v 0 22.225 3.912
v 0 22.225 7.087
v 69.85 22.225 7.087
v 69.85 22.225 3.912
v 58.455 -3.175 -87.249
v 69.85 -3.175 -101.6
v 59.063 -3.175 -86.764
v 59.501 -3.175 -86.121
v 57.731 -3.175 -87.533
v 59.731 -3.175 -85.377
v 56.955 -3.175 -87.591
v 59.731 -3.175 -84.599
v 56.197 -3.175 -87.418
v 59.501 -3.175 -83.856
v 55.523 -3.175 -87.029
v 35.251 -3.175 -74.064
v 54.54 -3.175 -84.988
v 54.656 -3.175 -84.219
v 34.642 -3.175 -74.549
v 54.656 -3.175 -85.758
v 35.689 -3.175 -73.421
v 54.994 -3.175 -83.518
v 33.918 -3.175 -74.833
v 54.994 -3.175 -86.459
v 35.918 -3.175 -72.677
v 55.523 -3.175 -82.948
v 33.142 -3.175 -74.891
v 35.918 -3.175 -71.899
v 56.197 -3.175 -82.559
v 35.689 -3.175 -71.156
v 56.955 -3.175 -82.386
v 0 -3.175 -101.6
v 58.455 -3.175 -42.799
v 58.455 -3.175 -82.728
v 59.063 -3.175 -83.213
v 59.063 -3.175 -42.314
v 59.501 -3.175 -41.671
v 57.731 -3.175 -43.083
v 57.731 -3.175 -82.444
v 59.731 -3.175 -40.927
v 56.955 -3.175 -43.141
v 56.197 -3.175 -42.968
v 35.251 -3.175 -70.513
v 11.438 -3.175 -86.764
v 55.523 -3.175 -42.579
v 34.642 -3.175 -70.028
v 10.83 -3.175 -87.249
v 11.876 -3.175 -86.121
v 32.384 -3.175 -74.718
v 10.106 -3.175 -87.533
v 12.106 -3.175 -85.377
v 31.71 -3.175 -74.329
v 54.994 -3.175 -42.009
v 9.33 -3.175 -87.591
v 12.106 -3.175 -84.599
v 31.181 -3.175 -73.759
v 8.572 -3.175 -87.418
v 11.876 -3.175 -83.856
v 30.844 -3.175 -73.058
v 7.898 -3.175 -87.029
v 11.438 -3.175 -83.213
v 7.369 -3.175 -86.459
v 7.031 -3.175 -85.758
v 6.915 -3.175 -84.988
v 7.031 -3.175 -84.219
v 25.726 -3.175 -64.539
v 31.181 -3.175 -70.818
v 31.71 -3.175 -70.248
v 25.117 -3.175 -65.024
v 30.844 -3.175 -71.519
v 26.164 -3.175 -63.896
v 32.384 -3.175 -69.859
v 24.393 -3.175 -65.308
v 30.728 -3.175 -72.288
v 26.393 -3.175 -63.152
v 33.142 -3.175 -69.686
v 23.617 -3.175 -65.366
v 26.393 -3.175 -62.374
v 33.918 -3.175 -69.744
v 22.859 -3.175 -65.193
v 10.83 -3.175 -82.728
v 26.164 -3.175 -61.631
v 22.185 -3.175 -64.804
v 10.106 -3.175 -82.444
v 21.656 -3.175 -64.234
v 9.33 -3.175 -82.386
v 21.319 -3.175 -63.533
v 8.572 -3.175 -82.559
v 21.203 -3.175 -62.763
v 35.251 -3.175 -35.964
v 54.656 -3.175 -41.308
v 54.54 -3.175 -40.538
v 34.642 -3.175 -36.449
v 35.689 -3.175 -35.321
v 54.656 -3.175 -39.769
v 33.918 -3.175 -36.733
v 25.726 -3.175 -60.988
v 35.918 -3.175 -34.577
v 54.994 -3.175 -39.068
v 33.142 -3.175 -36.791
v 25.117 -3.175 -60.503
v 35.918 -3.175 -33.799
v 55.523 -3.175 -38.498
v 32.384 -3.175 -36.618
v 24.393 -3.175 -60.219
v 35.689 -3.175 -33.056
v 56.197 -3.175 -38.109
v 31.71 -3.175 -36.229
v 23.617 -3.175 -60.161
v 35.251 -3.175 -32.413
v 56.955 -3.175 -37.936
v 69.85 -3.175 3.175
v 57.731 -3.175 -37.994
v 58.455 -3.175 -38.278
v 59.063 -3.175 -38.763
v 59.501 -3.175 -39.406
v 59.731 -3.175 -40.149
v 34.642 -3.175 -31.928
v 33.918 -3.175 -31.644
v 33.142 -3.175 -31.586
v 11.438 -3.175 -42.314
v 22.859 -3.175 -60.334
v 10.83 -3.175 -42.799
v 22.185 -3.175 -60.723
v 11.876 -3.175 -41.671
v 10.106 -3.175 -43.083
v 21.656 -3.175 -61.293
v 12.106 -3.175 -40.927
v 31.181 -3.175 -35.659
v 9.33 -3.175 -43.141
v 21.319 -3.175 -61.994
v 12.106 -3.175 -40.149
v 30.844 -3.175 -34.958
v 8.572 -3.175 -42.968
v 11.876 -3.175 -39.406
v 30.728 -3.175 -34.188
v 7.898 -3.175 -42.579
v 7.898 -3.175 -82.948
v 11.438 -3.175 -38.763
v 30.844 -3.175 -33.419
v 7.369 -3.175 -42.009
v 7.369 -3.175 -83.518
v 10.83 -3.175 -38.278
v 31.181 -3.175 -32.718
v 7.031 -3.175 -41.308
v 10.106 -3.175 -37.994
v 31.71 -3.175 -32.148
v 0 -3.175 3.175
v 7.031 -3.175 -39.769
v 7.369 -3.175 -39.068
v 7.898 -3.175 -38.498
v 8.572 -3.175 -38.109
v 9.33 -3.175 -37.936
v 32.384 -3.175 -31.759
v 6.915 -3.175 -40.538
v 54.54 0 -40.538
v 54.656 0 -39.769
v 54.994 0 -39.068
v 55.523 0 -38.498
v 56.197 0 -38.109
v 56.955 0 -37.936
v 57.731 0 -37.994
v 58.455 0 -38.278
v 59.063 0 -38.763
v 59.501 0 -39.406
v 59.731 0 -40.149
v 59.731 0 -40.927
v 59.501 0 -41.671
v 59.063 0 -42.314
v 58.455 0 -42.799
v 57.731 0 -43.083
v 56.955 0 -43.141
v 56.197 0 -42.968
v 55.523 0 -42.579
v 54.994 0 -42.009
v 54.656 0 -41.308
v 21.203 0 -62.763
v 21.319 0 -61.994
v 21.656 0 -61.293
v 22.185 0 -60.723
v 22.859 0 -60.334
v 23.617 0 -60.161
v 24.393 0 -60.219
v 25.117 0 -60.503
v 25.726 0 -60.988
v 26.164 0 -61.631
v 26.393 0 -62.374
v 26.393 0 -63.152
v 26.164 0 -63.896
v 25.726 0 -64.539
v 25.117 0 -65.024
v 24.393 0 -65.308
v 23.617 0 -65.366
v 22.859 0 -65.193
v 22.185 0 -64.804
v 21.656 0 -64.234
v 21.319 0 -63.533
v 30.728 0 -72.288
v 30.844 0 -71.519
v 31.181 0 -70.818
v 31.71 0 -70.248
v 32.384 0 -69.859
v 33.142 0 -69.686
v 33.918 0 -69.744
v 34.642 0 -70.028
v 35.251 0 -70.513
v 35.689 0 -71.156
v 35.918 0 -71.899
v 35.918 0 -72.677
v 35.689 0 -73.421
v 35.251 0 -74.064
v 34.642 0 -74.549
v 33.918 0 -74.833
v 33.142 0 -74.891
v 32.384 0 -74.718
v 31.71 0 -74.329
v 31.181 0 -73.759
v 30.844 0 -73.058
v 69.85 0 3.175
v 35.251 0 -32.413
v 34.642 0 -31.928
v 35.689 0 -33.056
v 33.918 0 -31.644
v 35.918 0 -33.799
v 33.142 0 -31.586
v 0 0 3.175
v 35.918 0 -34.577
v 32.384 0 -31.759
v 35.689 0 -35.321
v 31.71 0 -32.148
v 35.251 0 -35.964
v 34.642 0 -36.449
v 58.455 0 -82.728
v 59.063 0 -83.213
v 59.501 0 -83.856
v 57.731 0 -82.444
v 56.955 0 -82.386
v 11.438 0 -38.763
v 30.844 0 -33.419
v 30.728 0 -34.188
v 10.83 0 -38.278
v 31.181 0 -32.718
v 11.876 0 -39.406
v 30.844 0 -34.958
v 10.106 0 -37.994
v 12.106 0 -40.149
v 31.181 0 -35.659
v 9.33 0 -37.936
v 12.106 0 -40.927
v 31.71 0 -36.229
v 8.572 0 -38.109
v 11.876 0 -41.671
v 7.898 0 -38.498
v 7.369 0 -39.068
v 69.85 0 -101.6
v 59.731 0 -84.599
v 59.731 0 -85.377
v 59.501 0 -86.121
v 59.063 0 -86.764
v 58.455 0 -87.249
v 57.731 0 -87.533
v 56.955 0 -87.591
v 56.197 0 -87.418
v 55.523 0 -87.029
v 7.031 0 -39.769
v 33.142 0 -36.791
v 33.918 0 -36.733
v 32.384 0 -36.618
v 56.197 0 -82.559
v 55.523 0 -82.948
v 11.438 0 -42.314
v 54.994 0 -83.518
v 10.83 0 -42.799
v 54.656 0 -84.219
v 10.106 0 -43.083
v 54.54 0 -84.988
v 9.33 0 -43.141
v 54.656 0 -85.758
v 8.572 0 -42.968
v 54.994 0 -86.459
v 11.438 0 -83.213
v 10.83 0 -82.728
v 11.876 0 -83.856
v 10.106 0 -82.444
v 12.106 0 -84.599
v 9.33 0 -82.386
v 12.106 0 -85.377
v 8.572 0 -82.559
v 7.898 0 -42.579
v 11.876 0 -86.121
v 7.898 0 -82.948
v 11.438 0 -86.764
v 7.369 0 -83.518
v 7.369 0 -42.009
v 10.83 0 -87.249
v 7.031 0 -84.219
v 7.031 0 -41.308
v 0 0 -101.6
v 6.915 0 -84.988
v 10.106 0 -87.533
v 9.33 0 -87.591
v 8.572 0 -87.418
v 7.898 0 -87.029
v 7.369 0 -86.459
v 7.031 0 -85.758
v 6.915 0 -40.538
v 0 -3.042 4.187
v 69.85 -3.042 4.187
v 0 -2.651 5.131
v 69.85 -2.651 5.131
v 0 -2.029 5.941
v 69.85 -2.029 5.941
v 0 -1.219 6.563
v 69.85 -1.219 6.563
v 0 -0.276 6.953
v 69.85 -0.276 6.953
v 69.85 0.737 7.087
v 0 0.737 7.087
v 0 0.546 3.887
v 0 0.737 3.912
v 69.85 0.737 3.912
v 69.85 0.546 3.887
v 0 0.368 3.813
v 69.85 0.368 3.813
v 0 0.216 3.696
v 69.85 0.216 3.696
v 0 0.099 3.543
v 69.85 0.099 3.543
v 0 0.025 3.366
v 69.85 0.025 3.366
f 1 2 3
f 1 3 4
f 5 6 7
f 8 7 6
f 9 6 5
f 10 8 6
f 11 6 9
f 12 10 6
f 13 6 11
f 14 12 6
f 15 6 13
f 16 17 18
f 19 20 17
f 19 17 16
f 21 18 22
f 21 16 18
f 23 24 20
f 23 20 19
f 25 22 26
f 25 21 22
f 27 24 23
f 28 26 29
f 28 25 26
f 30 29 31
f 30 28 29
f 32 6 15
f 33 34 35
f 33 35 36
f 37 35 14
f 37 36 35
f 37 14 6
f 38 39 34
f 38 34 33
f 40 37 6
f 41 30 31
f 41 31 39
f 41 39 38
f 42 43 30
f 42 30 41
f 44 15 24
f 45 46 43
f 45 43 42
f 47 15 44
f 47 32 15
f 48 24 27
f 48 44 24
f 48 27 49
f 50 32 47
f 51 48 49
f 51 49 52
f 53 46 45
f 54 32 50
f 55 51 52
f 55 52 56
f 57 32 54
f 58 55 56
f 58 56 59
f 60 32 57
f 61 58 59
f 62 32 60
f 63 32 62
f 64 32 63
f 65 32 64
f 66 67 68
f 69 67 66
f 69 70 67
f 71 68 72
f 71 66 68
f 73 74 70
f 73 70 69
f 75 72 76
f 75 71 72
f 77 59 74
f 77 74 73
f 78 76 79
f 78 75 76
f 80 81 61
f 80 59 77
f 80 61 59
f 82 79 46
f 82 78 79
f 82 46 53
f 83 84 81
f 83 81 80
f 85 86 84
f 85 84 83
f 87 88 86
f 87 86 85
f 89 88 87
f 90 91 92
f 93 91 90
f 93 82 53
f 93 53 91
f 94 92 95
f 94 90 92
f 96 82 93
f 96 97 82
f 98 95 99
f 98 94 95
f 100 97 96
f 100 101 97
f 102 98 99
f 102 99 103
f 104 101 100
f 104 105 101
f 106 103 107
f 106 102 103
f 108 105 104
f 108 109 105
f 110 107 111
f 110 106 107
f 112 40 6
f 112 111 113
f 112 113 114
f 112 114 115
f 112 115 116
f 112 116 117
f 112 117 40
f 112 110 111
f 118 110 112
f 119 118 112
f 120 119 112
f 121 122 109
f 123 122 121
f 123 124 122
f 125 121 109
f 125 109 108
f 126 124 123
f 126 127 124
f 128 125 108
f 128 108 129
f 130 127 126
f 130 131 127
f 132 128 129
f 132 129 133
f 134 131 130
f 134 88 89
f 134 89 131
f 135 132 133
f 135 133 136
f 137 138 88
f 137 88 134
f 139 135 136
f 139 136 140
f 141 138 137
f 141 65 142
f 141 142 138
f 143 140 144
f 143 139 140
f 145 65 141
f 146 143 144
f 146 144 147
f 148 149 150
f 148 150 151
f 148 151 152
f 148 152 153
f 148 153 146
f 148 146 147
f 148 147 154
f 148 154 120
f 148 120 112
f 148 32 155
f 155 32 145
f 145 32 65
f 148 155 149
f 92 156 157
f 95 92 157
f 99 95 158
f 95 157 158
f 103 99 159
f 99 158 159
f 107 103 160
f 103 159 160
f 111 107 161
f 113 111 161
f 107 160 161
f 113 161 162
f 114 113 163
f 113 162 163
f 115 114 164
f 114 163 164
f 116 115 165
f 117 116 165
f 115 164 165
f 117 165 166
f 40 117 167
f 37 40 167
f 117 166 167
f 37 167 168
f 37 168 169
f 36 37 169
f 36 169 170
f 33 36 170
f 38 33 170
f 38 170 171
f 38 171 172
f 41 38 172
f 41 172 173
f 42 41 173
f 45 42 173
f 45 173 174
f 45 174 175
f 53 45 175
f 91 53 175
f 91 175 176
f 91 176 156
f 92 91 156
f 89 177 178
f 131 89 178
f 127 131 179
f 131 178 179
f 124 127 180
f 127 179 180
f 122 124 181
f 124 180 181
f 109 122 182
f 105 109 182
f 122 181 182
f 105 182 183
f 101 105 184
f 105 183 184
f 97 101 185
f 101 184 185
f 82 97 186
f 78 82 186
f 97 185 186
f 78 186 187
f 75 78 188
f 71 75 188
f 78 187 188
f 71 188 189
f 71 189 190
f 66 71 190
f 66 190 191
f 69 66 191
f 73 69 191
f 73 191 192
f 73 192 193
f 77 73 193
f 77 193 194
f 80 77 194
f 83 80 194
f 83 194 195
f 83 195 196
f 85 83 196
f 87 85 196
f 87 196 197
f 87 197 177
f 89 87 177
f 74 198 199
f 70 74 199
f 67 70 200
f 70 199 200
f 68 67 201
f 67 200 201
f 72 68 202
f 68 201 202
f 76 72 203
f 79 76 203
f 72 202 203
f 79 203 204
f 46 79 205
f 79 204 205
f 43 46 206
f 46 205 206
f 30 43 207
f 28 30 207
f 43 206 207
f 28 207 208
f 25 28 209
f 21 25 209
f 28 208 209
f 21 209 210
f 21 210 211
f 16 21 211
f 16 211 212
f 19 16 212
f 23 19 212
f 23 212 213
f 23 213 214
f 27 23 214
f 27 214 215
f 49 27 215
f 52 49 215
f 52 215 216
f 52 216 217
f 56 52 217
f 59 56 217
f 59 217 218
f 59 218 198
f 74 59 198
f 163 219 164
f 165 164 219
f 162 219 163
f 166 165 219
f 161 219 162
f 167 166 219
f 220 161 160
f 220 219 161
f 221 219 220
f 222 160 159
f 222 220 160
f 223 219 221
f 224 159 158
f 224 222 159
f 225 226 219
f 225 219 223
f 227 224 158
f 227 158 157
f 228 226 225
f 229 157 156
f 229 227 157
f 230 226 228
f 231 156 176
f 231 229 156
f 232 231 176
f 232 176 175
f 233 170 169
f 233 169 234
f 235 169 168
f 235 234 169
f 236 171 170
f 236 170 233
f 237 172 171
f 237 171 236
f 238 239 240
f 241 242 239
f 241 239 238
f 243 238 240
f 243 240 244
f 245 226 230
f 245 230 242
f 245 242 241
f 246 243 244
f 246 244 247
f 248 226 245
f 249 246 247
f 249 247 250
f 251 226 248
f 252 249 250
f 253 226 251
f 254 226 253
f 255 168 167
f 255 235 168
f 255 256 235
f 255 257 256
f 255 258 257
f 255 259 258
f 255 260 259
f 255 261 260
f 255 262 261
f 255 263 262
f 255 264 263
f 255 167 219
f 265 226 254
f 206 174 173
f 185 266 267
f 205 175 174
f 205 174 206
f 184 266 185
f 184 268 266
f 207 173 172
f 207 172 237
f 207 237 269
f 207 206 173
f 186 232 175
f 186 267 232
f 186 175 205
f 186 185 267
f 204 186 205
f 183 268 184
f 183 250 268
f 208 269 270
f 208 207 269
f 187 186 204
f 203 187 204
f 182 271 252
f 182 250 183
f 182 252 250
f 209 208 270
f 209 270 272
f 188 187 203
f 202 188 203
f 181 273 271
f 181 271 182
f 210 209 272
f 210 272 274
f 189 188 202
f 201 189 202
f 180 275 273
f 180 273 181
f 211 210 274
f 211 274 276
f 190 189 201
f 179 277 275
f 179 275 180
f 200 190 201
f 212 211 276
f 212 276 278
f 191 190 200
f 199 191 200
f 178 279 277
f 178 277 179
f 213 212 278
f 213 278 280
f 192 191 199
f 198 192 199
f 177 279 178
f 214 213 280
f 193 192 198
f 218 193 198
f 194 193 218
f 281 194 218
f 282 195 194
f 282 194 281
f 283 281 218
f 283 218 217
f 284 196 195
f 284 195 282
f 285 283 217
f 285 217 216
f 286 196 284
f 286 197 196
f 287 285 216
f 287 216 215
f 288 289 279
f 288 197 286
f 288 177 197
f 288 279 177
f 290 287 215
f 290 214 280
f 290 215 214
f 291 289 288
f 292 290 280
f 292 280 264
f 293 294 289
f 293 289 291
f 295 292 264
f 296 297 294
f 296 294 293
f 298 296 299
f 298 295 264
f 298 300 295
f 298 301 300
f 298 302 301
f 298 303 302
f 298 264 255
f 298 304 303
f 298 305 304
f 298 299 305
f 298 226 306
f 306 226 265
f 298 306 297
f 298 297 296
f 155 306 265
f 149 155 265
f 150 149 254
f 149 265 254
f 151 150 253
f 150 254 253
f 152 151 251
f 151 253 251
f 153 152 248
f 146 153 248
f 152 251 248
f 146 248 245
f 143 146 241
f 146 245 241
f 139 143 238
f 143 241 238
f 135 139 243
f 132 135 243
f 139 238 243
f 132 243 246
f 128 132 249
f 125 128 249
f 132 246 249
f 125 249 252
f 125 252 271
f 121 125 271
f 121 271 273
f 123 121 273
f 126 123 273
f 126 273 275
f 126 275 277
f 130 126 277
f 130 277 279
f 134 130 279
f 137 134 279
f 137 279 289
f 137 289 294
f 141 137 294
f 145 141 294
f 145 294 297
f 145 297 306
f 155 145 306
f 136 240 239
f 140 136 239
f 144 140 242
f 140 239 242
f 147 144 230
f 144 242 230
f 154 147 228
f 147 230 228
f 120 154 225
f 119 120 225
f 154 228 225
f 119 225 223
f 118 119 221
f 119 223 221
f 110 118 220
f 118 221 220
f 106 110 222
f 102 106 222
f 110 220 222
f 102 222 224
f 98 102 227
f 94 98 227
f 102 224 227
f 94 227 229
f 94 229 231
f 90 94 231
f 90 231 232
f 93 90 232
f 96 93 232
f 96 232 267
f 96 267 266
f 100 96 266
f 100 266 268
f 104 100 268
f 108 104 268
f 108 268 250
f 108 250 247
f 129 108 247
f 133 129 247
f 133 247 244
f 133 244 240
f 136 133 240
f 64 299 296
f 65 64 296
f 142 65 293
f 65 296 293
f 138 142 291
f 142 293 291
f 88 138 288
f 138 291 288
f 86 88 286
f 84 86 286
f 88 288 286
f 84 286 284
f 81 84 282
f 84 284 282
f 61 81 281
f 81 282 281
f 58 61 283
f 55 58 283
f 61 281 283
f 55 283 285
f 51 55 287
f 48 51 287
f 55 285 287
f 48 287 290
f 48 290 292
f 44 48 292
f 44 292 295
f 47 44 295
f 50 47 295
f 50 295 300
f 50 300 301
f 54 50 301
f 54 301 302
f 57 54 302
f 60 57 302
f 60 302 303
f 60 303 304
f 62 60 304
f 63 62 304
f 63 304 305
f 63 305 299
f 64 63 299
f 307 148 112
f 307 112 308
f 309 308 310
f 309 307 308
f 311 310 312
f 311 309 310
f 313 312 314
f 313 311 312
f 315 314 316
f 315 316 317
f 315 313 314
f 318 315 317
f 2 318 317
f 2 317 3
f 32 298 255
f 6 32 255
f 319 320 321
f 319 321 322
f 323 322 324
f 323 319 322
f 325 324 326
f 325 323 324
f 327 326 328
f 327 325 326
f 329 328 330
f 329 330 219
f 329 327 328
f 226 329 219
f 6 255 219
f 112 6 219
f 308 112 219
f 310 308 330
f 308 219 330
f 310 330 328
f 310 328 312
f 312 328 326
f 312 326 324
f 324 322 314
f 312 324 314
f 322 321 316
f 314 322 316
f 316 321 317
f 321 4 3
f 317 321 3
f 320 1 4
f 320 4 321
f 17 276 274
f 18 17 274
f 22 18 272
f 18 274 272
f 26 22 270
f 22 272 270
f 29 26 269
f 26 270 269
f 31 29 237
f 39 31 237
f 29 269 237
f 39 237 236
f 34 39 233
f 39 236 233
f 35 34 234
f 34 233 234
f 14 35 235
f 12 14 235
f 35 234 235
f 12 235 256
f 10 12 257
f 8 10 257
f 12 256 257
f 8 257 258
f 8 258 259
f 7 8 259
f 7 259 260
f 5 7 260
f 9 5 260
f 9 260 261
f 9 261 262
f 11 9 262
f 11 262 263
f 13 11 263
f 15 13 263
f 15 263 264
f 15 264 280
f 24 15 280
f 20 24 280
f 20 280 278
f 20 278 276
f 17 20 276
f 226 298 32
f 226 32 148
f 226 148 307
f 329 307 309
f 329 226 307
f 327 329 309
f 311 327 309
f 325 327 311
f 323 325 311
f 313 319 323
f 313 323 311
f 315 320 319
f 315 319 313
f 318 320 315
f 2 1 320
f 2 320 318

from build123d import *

# Parameters (mm, degrees)
SKETCH1_W                   = 69.85
SKETCH1_H                   = 101.6
BASE_FLANGE1_DEPTH          = 3.175
EDGE_FLANGE1_DEPTH          = 69.85
F_5_0_2055_DIAMETER_HOLE1_D = 5.2197


# Sheet-metal steps are written as plain solids
with BuildPart() as part:
    # Sketch1 → Base-Flange1 (new body)
    with BuildSketch(Plane(origin=(0, 0, 0), x_dir=(1, 0, 0), z_dir=(0, 1, 0))):
        with Locations((34.925, 50.8)):
            Rectangle(SKETCH1_W, SKETCH1_H)
    extrude(amount=-BASE_FLANGE1_DEPTH)

    # Edge-Flange1 section (across the edge) → Edge-Flange1 (add)
    with BuildSketch(Plane(origin=(0, 0, 3.9116), x_dir=(0, 0, -1), z_dir=(1, 0, 0))):
        with BuildLine():
            Line((-3.175, 0.7366), (-3.175, 22.225))
            Line((-3.175, 22.225), (0, 22.225))
            Line((0, 22.225), (0, 0.7366))
            ThreePointArc((0, 0.7366), (0.215745145, 0.215745145), (0.7366, 0))
            Line((0.7366, 0), (3.9116, 0))
            Line((3.9116, 0), (3.9116, -3.175))
            Line((3.9116, -3.175), (0.7366, -3.175))
            ThreePointArc((0.7366, -3.175), (-2.029318885, -2.029318885), (-3.175, 0.7366))
        make_face()
    extrude(amount=EDGE_FLANGE1_DEPTH)

    # #5 (0.2055) Diameter Hole1 (through all)
    with Locations(Plane.XZ.offset(3.175)):
        with Locations((33.3375, -34.1884), (23.8125, -62.7634), (33.3375, -72.2884), (57.15, -84.9884), (57.15, -40.5384), (9.525, -40.5384), (9.525, -84.9884)):
            Hole(F_5_0_2055_DIAMETER_HOLE1_D / 2)


solid = part.part
